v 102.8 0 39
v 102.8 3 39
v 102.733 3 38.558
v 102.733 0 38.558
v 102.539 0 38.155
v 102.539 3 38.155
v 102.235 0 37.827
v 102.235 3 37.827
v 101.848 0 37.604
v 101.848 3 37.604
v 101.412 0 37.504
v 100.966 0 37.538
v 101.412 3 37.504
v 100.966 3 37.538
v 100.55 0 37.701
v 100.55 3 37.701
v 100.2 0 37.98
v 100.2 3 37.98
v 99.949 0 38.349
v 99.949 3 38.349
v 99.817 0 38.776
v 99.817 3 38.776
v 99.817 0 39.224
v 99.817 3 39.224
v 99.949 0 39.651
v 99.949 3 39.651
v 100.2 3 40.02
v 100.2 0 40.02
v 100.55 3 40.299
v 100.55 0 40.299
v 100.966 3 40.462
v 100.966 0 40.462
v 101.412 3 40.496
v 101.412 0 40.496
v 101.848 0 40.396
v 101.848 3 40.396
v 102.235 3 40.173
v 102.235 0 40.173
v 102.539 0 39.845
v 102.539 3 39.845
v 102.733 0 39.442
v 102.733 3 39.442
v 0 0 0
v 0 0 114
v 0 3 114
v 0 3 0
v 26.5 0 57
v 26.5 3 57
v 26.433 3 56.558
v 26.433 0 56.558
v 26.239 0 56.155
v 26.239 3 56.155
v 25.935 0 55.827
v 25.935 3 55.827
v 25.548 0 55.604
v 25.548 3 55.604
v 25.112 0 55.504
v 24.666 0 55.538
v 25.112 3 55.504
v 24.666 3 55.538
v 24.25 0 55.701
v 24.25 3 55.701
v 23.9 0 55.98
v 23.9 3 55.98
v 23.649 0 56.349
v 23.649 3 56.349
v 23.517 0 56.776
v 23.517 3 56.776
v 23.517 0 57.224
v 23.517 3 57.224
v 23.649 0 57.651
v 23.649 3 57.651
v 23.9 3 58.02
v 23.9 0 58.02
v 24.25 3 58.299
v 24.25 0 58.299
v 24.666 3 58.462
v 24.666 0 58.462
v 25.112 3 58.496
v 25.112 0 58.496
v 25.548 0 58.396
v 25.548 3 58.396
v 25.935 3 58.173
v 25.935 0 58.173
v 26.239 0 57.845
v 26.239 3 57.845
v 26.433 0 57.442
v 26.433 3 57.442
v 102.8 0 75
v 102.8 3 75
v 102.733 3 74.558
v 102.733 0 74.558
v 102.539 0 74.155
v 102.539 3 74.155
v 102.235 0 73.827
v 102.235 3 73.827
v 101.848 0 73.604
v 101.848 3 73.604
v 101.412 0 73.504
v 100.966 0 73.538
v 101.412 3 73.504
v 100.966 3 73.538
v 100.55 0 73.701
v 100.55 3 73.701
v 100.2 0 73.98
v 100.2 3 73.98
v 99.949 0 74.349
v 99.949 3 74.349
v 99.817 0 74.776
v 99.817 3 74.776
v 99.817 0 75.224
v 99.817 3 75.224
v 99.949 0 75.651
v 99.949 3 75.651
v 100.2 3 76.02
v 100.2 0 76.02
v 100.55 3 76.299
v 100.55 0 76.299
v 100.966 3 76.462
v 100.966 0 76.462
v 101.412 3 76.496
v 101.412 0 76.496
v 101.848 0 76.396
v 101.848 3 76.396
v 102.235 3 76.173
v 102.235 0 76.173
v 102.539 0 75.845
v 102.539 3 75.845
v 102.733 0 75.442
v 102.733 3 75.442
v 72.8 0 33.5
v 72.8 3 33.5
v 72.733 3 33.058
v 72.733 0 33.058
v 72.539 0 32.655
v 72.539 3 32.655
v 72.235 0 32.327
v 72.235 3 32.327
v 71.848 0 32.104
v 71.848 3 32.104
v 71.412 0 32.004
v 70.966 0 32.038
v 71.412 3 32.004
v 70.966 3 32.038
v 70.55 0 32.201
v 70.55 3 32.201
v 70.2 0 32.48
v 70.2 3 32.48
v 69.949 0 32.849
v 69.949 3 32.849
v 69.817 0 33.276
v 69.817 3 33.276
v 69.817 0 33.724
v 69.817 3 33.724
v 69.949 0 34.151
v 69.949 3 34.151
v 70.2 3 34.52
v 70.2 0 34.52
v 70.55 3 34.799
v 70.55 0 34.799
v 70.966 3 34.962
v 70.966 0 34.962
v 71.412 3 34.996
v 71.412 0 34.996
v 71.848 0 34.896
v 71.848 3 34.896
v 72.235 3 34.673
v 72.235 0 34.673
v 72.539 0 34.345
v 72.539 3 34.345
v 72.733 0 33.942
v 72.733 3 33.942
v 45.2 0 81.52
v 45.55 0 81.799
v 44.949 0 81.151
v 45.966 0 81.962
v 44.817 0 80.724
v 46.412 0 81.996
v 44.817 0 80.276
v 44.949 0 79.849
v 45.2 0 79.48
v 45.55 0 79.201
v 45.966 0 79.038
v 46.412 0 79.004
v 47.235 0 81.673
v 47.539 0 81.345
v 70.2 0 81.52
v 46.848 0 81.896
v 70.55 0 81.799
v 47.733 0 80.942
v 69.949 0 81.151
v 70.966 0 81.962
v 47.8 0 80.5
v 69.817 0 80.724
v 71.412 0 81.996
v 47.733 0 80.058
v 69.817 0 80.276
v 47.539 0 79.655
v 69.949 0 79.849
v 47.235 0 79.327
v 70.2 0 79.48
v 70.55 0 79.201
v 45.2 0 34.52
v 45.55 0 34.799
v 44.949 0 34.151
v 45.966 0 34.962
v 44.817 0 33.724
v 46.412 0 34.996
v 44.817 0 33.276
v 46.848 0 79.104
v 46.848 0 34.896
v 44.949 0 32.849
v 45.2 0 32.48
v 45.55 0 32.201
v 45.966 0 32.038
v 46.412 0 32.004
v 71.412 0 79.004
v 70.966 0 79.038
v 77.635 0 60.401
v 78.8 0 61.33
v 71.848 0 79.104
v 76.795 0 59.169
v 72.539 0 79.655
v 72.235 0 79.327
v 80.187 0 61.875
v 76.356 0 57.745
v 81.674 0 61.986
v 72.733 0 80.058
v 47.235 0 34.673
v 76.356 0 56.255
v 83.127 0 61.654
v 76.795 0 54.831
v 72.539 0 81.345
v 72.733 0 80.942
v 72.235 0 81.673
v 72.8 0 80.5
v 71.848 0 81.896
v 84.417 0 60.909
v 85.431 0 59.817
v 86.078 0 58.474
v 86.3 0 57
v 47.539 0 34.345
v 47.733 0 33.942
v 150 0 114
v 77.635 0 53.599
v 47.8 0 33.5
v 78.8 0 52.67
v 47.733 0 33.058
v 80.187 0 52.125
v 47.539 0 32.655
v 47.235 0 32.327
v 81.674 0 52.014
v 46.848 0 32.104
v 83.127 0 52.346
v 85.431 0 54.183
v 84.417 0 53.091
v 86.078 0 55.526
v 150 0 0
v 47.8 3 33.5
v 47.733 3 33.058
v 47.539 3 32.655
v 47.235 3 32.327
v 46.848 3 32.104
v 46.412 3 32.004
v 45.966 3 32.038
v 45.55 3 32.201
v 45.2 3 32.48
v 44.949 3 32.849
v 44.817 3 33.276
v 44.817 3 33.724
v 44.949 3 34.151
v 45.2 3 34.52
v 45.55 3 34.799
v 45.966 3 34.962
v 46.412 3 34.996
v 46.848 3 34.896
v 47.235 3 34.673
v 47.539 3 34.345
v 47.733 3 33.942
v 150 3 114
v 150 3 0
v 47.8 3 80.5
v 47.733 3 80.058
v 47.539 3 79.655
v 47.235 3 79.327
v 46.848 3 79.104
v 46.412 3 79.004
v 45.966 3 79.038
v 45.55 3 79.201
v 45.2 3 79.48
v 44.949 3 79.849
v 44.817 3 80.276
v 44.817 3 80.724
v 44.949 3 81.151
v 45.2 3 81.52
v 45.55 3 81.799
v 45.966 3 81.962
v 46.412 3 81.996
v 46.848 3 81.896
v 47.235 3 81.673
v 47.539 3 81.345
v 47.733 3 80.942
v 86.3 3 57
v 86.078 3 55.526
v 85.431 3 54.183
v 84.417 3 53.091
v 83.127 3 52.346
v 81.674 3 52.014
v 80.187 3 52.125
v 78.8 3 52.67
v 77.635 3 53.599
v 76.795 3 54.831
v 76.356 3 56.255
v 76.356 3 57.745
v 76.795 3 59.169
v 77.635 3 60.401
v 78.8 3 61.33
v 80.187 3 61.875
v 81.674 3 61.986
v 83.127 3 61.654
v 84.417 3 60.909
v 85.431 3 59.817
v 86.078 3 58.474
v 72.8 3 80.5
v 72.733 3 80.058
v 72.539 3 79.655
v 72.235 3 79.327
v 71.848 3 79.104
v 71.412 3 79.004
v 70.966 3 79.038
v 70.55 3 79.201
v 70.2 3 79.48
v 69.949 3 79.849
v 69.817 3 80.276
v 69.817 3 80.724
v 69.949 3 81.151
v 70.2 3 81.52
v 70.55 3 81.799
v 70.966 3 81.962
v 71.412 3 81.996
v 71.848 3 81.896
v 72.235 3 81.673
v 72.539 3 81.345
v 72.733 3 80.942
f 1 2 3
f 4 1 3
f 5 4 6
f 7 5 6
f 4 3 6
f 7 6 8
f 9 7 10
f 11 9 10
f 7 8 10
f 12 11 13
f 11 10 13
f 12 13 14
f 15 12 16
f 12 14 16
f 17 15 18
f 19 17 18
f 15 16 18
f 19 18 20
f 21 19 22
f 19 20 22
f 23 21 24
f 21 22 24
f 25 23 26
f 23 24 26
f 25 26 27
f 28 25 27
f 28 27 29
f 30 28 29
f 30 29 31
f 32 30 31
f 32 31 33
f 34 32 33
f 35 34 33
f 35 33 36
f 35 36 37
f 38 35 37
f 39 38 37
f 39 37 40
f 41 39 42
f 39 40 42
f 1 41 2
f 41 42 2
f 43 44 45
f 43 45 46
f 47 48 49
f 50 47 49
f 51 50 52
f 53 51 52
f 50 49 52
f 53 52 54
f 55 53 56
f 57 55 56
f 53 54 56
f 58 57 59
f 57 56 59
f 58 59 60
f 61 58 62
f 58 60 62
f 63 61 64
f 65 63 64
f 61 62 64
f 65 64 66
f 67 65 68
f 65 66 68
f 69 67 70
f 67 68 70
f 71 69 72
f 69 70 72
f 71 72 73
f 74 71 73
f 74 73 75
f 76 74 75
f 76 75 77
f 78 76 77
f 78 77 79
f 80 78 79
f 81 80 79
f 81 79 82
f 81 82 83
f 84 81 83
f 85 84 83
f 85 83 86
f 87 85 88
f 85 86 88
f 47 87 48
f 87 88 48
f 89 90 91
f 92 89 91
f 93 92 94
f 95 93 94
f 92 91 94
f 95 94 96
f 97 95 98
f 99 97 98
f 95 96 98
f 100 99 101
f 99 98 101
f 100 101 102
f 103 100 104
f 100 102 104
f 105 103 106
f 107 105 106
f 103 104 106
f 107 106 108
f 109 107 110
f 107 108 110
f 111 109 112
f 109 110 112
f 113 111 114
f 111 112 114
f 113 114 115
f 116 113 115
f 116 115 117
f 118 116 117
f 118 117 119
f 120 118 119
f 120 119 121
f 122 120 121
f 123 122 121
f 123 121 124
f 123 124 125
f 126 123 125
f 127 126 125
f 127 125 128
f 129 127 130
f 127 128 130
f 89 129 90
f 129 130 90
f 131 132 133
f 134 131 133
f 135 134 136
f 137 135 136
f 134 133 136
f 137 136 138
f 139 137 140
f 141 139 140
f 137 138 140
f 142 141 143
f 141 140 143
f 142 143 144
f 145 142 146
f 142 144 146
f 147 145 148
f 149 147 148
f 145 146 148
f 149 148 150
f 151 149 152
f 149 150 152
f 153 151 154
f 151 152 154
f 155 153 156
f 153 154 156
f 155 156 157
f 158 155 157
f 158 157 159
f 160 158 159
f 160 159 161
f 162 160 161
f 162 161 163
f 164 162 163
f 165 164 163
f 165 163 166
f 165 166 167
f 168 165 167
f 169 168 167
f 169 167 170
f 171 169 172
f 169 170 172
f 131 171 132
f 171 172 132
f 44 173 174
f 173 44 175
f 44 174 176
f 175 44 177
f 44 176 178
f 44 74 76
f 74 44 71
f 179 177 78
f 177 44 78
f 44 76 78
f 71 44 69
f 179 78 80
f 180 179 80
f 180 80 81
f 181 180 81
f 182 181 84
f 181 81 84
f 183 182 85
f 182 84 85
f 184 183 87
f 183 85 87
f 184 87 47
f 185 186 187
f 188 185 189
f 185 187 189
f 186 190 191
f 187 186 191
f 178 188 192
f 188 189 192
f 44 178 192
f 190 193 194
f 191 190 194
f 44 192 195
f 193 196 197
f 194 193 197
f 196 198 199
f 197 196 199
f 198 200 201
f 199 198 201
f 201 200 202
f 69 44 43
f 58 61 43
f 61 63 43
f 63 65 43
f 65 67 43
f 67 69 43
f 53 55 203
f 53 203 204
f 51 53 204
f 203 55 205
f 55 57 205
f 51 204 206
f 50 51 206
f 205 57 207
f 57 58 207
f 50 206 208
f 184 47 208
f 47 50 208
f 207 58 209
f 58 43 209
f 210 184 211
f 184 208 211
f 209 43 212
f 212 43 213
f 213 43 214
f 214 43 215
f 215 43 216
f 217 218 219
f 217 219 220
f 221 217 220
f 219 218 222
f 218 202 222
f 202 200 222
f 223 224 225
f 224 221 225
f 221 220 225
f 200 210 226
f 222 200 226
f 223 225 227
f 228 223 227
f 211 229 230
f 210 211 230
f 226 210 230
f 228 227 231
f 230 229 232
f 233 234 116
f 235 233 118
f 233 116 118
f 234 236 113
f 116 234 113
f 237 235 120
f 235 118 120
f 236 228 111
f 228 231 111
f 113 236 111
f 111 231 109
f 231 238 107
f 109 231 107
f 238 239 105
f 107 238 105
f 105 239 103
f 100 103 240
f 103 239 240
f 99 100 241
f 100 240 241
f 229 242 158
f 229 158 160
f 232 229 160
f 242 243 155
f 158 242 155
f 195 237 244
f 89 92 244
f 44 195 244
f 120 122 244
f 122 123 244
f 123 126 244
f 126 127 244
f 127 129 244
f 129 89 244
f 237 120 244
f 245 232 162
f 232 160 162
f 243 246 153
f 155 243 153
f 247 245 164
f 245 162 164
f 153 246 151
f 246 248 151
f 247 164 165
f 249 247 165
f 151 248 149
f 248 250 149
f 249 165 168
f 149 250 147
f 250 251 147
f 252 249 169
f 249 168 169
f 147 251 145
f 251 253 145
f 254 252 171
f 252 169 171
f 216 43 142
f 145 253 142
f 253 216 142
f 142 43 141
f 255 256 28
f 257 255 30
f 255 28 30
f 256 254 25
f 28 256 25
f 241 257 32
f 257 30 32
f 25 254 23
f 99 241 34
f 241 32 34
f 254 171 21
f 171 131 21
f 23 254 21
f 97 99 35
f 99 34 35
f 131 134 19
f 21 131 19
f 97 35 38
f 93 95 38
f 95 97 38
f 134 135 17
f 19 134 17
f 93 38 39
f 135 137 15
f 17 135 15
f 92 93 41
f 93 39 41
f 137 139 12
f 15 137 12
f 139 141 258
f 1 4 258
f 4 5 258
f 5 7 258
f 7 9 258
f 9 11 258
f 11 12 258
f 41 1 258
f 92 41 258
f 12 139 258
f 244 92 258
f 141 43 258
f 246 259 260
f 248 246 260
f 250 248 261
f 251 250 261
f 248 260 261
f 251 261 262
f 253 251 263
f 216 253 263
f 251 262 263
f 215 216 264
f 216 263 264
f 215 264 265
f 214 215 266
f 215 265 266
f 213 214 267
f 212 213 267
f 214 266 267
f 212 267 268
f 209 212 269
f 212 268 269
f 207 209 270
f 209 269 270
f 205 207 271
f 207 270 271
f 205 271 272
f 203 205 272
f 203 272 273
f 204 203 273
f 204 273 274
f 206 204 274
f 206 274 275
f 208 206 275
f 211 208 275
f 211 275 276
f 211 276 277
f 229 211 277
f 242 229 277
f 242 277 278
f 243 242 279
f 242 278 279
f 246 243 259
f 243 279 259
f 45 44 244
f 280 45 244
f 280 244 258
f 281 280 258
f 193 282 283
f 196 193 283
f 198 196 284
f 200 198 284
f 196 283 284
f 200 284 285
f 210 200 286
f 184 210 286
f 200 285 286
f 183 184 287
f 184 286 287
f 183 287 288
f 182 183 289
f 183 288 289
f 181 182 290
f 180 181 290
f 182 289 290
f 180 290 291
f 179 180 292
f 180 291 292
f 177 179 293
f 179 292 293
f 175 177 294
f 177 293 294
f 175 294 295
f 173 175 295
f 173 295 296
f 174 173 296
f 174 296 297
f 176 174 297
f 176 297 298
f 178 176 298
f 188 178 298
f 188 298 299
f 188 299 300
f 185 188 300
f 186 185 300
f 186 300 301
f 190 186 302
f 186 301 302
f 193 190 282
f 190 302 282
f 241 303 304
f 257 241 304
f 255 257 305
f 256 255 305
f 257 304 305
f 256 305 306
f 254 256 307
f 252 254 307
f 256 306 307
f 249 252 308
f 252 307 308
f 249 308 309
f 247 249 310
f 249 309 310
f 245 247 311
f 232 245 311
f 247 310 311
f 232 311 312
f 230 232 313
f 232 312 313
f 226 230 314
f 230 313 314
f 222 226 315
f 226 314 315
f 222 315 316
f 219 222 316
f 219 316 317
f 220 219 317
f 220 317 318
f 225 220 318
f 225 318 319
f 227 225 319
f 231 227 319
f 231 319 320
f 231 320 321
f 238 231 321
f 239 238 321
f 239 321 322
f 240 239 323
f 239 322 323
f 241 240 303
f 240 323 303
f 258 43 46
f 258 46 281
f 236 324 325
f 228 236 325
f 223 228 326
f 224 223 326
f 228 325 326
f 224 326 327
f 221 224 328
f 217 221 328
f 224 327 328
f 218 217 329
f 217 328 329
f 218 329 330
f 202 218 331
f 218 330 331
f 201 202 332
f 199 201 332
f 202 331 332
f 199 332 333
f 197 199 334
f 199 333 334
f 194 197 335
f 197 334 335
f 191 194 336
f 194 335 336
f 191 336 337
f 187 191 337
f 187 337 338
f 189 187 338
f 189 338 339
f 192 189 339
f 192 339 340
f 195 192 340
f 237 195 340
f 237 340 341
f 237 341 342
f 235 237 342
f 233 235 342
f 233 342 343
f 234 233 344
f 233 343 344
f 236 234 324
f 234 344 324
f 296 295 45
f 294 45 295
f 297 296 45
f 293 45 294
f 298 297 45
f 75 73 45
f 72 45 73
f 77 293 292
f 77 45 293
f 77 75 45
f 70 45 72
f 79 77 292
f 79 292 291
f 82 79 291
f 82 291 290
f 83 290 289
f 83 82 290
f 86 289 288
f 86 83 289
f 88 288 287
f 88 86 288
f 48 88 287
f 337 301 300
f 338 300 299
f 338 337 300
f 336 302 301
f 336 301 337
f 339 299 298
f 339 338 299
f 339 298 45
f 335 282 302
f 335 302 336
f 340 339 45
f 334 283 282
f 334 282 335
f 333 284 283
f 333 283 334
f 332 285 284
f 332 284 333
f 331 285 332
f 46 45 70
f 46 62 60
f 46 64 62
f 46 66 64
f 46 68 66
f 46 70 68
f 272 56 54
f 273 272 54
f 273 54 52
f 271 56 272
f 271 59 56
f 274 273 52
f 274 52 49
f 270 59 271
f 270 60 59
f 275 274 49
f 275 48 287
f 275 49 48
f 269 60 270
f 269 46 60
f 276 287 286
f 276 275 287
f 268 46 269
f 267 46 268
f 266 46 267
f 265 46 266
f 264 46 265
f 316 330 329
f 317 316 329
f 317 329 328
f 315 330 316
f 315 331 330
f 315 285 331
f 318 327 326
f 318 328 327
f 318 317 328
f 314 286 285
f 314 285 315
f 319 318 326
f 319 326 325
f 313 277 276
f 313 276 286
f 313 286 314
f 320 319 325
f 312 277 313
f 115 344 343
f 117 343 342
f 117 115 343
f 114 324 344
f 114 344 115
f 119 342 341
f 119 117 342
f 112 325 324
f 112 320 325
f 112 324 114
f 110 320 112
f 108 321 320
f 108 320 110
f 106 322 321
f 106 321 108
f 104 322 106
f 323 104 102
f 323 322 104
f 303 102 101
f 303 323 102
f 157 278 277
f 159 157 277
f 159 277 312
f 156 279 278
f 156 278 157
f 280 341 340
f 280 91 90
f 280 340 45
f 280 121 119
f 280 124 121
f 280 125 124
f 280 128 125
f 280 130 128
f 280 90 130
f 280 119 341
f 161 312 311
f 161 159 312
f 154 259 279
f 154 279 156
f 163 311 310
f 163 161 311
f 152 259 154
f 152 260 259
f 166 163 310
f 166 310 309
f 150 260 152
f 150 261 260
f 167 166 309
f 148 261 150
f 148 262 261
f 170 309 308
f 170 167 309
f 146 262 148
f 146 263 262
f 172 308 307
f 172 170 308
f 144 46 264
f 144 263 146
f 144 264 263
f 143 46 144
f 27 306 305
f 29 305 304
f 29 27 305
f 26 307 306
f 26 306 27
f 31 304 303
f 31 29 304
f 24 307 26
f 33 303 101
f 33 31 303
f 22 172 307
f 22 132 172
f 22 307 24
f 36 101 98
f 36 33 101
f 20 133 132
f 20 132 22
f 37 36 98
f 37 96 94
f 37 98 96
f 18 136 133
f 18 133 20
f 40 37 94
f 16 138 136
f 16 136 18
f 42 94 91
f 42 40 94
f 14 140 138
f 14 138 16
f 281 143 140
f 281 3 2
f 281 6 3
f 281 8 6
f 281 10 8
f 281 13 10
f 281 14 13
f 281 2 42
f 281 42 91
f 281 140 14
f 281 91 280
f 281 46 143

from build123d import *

# Parameters (mm, degrees)
SKETCH_1_W          = 150
SKETCH_1_H          = 114
EXTRUDE_1_DEPTH     = 3
SKETCH_2_R          = 1.5
SKETCH_2_R_2        = 5
CUT_EXTRUDE_1_DEPTH = 3


with BuildPart() as part:
    # 草图1 → 凸台-拉伸1 (new body)
    with BuildSketch(Plane(origin=(0, 0, 0), x_dir=(1, 0, 0), z_dir=(0, 1, 0))):
        with Locations((75, -57)):
            Rectangle(SKETCH_1_W, SKETCH_1_H)
    extrude(amount=EXTRUDE_1_DEPTH)

    # 草图2 → 切除-拉伸1 (cut)
    with BuildSketch(Plane(origin=(0, 3, 0), x_dir=(1, 0, 0), z_dir=(0, 1, 0))):
        with Locations((25, -57)):
            Circle(SKETCH_2_R)
        with Locations((101.3, -75)):
            Circle(SKETCH_2_R)
        with Locations((101.3, -39)):
            Circle(SKETCH_2_R)
        with Locations((71.3, -80.5)):
            Circle(SKETCH_2_R)
        with Locations((46.3, -80.5)):
            Circle(SKETCH_2_R)
        with Locations((71.3, -33.5)):
            Circle(SKETCH_2_R)
        with Locations((46.3, -33.5)):
            Circle(SKETCH_2_R)
        with Locations((81.3, -57)):
            Circle(SKETCH_2_R_2)
    extrude(amount=-CUT_EXTRUDE_1_DEPTH, mode=Mode.SUBTRACT)


solid = part.part
